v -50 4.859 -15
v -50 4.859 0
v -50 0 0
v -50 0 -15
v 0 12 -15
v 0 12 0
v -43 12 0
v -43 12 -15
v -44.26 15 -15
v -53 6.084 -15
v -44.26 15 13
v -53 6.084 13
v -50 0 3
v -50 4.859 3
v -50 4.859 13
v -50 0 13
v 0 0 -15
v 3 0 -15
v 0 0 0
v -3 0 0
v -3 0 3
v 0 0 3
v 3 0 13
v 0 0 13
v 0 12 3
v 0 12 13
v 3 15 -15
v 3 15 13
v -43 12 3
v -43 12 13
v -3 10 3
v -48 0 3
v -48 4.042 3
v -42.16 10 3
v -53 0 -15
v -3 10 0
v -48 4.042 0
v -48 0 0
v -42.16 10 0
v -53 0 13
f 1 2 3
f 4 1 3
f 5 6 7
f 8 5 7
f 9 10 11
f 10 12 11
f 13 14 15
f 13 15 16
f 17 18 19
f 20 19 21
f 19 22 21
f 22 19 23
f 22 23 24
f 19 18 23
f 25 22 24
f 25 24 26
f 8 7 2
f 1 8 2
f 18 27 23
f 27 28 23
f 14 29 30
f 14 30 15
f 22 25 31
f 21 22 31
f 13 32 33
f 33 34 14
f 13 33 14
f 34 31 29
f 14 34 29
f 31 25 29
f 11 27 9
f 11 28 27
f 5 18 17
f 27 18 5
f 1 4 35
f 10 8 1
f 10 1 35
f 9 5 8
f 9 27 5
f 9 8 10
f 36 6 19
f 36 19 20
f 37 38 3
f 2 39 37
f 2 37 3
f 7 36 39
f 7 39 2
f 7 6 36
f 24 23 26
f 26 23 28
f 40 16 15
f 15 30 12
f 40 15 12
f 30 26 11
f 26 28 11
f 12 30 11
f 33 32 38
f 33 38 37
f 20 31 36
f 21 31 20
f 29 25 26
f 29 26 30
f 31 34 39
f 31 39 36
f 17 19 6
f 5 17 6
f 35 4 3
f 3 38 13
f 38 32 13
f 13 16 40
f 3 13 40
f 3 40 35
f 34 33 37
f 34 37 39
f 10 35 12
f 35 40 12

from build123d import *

# Parameters (mm, degrees)
PAD_DEPTH         = 3
PAD001_DEPTH      = 10
PAD001_DEPTH_BACK = 18
POCKET_DEPTH      = 5


with BuildPart() as part:
    # Sketch → Pad (new body)
    with BuildSketch(Plane.XY):
        Polygon((-43, 12), (0, 12), (0, 0), (-50, 0), (-50, 4.858572), align=None)
    extrude(amount=PAD_DEPTH)

    # Sketch001 (on Face7 of Pad) → Pad001 (join, two sides)
    with BuildSketch(Plane.XY.offset(3)) as pad001_sk:
        Polygon((-50, 0), (-53, 0), (-53, 6.083674), (-44.260252, 15), (0, 15), (3, 15), (3, 0), (0, 0), (0, 12), (-43, 12), (-50, 4.858572), align=None)
    extrude(amount=PAD001_DEPTH)
    extrude(pad001_sk.sketch, amount=-PAD001_DEPTH_BACK)

    # Sketch002 (on Face18 of Pad001) → Pocket (cut)
    with BuildSketch(Plane.XY.offset(3)):
        Polygon((-48, 0), (-48, 4.041837), (-42.159832, 10), (-3, 10), (-3, 0), align=None)
    extrude(amount=-POCKET_DEPTH, mode=Mode.SUBTRACT)


solid = part.part
